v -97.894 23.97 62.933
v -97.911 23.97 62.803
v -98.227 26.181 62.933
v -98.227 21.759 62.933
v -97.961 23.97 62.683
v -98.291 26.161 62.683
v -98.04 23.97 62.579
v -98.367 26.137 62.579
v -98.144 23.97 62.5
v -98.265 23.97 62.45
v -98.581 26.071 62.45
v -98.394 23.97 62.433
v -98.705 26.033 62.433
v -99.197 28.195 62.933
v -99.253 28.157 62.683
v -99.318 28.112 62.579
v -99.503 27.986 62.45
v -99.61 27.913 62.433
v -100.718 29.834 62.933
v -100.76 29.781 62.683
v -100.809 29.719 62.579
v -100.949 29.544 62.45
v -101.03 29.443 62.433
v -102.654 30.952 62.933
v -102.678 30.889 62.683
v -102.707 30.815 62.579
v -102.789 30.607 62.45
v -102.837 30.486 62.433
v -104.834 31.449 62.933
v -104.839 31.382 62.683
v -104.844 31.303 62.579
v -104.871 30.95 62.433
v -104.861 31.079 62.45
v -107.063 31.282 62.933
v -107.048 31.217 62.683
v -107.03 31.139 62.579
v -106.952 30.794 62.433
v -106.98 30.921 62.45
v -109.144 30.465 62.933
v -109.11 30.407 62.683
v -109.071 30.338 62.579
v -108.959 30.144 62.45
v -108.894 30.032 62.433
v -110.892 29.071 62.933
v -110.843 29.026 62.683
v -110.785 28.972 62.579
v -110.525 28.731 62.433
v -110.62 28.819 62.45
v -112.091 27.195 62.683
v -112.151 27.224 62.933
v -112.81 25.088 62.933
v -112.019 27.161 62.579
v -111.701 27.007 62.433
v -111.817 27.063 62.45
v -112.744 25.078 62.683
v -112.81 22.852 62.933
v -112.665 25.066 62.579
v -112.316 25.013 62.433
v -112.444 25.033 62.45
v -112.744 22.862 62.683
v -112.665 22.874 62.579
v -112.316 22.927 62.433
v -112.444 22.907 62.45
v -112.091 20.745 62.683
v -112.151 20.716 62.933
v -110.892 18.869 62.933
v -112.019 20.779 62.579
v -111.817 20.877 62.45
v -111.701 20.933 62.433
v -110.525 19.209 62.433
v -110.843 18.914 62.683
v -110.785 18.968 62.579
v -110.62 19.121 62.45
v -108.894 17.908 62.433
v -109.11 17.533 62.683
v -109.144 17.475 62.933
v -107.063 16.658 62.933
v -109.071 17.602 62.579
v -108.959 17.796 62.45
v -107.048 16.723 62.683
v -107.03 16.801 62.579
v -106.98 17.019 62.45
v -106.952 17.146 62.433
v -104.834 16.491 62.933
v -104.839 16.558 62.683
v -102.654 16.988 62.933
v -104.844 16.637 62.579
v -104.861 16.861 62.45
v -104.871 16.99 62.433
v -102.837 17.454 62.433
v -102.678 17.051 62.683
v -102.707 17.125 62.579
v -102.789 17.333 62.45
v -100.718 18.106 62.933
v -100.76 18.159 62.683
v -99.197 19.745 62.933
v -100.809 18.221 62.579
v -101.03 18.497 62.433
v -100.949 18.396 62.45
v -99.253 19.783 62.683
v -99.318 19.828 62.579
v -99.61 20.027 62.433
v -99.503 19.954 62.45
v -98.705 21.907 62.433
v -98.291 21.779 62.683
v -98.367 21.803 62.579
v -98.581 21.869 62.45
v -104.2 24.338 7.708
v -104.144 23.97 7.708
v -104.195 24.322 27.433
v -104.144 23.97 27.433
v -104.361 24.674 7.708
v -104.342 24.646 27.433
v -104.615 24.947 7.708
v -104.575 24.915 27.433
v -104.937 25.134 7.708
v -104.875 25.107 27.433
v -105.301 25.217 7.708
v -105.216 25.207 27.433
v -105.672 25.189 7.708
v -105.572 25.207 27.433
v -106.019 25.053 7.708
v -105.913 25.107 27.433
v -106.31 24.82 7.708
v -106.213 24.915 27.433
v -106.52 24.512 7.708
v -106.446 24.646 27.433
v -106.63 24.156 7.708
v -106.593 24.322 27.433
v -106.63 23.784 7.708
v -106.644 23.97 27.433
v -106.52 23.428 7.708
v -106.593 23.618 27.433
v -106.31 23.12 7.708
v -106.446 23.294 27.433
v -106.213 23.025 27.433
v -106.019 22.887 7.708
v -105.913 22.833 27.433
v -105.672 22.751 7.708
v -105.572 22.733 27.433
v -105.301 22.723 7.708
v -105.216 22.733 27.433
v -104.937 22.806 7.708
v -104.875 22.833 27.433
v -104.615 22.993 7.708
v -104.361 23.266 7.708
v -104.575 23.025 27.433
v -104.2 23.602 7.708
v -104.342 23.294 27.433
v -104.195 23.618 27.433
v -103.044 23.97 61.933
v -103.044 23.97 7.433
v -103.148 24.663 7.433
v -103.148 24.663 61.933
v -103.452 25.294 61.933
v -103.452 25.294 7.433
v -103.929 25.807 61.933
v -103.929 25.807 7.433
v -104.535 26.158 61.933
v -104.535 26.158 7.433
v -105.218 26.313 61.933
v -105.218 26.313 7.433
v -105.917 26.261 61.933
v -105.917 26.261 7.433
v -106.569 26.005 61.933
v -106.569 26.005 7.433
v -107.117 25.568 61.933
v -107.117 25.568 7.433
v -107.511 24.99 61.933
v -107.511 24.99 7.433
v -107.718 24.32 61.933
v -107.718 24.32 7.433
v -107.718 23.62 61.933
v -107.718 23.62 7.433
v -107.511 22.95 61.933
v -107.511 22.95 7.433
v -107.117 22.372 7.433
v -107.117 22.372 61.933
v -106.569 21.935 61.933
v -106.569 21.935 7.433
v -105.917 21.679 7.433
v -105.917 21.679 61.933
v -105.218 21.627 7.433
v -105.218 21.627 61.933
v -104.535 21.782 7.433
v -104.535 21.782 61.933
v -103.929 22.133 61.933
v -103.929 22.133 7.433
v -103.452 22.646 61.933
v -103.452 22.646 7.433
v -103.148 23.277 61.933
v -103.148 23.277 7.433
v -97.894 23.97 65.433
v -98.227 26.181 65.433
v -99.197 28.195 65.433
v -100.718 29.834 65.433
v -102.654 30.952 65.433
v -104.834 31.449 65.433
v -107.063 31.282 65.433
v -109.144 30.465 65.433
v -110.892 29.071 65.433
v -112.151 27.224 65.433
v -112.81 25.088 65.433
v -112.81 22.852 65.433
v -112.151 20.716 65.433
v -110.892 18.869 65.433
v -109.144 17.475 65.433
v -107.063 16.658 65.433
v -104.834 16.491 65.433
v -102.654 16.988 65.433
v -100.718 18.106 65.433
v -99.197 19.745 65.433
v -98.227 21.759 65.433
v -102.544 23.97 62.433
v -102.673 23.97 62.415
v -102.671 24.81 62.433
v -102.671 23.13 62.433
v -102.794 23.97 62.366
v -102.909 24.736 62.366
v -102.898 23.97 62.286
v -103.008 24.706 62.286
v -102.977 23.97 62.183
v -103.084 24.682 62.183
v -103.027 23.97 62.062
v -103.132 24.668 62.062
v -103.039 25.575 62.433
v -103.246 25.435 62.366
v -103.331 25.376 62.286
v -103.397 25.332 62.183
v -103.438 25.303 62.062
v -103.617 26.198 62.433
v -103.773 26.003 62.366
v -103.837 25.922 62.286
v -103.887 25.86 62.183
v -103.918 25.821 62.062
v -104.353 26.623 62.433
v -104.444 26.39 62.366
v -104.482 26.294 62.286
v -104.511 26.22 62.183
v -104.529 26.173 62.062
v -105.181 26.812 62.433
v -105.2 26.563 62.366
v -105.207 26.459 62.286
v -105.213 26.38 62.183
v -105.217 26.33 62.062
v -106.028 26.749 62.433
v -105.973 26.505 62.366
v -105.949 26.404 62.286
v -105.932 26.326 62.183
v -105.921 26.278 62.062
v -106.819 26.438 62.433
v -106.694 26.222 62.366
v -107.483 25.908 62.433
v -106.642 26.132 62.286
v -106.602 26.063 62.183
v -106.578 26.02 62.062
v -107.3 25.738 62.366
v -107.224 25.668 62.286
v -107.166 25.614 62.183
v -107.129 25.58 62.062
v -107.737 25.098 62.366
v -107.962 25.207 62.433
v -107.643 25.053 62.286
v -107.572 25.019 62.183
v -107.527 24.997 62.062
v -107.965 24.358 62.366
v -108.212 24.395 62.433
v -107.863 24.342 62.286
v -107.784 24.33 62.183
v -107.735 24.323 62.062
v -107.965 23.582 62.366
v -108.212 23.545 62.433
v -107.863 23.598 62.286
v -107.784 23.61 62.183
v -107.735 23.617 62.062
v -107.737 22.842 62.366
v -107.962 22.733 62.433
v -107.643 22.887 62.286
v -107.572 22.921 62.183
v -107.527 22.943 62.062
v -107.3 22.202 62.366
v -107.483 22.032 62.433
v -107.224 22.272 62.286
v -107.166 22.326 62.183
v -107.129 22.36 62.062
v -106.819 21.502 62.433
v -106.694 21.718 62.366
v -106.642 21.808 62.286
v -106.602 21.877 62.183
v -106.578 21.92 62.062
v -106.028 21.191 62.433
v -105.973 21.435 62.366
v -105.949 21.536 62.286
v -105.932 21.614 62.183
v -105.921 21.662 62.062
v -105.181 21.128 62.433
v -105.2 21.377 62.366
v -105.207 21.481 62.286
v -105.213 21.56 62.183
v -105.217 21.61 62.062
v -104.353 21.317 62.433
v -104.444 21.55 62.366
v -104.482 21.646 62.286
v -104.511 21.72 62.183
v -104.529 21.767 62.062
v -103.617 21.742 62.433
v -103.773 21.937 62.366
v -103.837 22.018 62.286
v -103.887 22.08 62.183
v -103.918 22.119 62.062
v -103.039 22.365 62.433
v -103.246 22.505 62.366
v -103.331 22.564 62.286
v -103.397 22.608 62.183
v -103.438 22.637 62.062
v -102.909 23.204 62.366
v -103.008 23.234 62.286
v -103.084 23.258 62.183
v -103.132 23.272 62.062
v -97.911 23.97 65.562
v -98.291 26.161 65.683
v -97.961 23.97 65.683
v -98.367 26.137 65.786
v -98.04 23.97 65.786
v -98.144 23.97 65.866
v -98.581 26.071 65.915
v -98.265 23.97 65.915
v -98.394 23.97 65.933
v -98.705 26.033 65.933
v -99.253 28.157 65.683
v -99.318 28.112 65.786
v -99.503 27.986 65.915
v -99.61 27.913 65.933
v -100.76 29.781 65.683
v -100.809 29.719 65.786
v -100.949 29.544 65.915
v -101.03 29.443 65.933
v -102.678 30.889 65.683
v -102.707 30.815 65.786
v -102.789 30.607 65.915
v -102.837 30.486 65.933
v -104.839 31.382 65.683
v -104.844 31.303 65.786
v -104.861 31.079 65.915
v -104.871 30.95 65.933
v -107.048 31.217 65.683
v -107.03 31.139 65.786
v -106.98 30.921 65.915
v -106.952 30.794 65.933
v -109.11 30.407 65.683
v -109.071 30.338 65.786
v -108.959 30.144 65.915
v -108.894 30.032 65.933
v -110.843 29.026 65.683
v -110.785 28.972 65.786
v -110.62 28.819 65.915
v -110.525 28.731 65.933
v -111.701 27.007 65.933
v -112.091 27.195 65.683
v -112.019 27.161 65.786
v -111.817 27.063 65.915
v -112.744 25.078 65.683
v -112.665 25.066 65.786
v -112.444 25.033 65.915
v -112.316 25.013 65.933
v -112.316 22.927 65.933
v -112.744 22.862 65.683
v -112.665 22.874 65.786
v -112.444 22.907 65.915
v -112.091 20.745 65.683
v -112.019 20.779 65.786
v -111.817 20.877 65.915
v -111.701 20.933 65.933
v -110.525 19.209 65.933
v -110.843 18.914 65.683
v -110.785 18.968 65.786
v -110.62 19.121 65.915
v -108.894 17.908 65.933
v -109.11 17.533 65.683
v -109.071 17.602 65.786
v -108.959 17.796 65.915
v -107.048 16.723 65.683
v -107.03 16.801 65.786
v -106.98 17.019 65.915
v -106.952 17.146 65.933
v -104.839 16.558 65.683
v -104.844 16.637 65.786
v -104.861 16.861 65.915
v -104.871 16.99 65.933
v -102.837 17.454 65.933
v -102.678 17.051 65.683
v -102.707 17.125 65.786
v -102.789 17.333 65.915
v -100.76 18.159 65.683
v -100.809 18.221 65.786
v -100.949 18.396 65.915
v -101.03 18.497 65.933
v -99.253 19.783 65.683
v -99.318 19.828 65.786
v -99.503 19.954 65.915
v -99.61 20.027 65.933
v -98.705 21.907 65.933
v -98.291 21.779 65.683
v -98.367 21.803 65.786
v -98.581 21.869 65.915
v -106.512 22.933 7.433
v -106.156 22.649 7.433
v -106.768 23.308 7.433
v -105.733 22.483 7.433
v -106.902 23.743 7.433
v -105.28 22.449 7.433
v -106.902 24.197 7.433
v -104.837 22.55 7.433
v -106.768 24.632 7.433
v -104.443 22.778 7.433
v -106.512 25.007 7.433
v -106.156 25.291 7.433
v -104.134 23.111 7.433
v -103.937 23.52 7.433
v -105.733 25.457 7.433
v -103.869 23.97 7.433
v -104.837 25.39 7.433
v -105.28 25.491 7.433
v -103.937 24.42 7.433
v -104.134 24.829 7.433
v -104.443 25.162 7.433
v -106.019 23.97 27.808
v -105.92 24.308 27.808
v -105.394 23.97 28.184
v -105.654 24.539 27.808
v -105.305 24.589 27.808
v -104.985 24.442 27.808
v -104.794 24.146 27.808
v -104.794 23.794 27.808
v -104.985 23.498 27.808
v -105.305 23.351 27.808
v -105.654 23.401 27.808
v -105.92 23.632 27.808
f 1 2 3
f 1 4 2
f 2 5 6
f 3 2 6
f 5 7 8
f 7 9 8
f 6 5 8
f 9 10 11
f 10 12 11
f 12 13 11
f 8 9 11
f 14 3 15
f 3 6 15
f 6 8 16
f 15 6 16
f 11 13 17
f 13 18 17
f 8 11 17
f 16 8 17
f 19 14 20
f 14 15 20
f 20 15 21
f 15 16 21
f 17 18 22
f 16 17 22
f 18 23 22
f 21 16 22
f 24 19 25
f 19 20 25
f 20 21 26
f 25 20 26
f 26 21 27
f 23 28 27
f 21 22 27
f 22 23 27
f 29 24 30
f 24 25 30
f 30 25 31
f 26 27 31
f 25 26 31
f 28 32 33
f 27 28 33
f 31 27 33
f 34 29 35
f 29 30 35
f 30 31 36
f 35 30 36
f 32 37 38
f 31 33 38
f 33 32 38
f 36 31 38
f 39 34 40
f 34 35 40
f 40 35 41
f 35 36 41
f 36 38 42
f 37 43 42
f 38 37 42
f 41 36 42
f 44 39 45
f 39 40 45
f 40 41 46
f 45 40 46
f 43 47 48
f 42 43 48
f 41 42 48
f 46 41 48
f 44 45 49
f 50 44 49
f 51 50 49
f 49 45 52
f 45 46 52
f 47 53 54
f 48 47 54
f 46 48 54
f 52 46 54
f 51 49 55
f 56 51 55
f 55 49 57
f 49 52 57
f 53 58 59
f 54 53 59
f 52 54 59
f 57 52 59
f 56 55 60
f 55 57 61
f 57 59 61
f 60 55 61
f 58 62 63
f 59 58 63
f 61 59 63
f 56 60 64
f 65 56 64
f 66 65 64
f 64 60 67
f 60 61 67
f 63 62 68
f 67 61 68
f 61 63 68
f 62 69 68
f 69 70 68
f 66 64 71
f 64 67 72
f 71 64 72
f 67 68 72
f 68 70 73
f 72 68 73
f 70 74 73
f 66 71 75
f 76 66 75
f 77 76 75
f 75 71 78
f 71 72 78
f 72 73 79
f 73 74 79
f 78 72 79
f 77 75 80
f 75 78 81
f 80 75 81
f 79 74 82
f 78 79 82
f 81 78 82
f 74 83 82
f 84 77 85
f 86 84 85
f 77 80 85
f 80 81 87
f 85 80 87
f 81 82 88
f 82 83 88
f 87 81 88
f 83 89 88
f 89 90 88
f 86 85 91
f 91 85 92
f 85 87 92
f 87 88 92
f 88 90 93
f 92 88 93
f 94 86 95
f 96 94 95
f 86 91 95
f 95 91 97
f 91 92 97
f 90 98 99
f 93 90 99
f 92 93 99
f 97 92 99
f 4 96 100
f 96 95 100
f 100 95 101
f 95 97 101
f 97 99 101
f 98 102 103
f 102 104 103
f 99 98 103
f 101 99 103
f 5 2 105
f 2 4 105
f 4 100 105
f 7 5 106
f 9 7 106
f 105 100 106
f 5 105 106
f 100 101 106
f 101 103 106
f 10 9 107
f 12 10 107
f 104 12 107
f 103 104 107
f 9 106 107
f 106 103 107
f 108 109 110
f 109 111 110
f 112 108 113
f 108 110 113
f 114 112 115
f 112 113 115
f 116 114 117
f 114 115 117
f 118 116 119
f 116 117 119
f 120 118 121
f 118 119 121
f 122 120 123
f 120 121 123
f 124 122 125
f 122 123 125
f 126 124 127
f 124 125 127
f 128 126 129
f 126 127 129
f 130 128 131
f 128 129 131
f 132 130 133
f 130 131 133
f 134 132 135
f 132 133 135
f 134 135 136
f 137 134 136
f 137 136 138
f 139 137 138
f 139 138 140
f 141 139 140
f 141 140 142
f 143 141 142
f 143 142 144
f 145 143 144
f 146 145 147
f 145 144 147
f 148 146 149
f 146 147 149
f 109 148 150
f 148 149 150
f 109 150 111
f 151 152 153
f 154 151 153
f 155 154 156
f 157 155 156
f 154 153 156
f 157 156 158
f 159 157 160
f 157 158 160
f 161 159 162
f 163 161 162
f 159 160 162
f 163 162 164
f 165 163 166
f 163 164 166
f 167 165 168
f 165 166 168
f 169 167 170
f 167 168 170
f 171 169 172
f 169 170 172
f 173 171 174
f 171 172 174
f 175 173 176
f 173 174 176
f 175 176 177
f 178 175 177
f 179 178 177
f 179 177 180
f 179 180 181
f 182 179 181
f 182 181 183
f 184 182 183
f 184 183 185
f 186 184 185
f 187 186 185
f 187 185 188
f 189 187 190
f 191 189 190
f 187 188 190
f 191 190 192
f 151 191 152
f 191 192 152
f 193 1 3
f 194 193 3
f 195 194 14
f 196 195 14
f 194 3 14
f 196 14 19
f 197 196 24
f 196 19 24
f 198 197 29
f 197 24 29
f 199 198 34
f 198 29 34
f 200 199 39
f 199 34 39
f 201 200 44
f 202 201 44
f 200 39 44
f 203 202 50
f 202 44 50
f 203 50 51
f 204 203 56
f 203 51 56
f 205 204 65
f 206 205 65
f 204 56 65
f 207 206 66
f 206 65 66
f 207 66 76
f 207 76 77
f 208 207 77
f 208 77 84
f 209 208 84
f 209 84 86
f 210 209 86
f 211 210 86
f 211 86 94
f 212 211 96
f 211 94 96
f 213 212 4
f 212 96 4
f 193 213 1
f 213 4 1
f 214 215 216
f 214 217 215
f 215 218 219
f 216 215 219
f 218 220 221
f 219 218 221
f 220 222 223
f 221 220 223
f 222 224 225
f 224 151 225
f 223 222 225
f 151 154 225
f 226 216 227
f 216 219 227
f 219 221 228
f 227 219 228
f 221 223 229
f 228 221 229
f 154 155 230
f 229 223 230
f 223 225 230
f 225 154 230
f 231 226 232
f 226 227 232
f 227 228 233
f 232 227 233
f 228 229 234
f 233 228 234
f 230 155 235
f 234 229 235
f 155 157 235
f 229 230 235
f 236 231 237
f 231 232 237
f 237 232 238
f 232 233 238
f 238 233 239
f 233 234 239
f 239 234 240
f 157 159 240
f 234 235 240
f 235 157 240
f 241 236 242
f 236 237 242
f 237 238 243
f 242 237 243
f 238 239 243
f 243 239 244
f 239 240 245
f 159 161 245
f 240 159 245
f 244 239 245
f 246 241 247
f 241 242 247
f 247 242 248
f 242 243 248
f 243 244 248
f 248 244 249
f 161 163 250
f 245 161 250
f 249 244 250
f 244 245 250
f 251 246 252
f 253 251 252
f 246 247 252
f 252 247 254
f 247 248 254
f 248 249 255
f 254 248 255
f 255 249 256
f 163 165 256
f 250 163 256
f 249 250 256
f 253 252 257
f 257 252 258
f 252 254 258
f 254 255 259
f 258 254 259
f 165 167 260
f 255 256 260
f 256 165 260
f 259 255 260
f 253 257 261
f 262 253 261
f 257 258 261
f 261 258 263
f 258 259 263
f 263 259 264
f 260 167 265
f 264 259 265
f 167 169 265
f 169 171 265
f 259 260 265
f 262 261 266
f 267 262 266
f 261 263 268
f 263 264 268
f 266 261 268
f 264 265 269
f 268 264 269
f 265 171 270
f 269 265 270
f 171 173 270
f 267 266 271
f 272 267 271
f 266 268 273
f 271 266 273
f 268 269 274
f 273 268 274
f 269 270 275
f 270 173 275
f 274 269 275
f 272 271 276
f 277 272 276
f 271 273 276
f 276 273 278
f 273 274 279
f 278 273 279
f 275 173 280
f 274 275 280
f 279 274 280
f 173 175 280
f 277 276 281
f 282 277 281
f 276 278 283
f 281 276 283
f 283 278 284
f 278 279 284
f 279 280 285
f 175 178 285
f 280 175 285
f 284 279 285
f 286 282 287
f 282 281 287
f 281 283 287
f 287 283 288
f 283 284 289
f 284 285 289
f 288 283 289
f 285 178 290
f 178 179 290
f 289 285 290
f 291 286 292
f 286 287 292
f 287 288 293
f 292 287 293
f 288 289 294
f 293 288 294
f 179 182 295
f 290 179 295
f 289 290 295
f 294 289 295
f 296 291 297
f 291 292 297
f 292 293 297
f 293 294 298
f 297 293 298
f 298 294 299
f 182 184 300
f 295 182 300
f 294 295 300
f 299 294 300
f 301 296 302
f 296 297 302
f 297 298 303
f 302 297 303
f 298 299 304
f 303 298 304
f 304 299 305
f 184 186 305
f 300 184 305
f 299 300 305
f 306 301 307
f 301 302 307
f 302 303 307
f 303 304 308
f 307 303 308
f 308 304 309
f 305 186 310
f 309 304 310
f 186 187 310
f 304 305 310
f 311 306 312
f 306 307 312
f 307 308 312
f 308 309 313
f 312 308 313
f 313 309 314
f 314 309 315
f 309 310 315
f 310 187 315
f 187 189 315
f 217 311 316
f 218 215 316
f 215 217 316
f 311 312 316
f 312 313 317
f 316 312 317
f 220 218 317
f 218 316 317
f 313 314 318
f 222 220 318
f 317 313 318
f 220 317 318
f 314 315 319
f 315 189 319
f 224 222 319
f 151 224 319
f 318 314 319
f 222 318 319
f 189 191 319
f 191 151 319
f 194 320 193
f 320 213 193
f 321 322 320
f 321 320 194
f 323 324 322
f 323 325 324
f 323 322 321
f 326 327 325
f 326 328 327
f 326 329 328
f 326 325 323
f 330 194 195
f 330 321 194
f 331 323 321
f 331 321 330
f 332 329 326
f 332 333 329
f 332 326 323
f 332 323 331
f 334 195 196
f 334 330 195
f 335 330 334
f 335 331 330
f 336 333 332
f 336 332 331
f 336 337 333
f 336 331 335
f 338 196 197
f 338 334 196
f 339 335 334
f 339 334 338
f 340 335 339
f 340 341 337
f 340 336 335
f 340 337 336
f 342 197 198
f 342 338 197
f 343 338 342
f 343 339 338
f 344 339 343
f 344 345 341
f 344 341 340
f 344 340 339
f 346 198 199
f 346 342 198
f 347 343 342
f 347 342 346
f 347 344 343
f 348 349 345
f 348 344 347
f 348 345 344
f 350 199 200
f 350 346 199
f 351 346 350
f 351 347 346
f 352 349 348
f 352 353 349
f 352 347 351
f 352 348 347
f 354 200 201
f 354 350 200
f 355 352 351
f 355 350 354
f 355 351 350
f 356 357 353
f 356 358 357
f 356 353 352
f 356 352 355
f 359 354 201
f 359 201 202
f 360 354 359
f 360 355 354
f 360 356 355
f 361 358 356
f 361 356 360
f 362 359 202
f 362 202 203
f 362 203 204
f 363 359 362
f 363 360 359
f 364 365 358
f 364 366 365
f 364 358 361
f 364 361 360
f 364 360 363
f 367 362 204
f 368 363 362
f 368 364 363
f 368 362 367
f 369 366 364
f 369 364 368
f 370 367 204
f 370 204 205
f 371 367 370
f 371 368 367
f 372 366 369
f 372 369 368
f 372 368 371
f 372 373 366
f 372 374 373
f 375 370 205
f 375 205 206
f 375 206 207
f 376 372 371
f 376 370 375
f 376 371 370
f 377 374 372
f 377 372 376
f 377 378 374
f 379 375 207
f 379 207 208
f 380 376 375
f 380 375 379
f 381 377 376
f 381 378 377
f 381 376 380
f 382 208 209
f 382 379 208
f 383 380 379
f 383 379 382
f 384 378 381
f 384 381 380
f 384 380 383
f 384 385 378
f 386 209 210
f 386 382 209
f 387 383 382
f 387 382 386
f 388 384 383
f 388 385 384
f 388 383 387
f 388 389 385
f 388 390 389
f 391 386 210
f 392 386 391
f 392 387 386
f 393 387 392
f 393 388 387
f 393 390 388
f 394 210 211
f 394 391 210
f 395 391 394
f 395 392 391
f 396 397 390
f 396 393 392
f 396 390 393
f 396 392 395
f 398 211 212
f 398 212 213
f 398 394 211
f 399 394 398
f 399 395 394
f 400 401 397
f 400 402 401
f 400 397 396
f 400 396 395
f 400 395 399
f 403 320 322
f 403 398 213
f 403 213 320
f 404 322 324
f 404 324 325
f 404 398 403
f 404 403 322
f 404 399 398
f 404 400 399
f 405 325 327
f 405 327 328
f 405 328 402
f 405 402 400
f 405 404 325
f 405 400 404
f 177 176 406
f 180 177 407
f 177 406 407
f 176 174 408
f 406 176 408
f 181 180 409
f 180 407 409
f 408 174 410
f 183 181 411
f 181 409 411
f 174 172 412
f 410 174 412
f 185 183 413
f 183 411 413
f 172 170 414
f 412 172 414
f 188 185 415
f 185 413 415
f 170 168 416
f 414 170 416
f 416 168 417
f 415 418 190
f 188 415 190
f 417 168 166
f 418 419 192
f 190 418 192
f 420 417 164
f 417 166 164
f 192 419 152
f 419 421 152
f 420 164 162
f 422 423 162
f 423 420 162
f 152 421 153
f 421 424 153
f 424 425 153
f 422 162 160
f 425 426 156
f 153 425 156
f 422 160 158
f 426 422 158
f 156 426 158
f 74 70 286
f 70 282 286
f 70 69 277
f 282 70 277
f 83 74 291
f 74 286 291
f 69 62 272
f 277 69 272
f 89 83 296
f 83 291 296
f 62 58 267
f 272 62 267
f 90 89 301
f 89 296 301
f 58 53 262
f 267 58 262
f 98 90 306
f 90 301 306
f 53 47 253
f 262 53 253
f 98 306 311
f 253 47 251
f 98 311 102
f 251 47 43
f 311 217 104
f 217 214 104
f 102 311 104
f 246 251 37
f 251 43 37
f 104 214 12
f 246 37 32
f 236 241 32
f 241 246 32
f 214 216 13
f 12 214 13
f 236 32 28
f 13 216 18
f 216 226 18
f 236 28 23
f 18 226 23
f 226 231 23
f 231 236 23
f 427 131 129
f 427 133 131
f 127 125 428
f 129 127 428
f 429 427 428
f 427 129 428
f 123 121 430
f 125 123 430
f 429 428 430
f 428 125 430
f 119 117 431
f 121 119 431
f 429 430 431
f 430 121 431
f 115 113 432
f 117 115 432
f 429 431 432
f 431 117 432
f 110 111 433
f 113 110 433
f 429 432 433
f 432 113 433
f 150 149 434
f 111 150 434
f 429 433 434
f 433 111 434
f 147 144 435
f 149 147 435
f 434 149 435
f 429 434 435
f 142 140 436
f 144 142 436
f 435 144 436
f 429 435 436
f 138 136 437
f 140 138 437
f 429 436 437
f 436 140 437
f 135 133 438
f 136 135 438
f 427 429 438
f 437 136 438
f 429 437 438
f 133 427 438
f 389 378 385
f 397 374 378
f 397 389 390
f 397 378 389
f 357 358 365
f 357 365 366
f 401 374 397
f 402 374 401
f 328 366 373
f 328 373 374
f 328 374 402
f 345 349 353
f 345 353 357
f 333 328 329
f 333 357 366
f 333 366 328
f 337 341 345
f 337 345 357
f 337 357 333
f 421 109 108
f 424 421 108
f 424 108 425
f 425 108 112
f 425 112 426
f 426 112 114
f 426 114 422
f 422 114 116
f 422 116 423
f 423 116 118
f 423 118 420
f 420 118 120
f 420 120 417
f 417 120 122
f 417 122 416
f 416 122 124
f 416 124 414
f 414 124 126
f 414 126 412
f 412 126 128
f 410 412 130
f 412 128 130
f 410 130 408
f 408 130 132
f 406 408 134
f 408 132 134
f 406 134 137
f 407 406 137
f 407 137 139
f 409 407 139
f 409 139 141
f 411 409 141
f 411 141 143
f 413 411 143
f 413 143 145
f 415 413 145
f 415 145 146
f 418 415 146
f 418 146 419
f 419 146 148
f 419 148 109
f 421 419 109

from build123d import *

# Parameters (mm, degrees)
SKETCH2_R                       = 2.35
BOSS_EXTRUDE1_DEPTH             = 55
SKETCH3_R                       = 7.5
BOSS_EXTRUDE2_DEPTH             = 3.5
FILLET1_R                       = 0.5
M3X0_5_TAPPED_HOLE1_D           = 2.5
M3X0_5_TAPPED_HOLE1_DEPTH       = 20
M3X0_5_TAPPED_HOLE1_CSINK_D     = 3.05
M3X0_5_TAPPED_HOLE1_CSINK_ANGLE = 90
M3X0_5_TAPPED_HOLE1_TIP         = 0.751075774


with BuildPart() as part:
    # Sketch2 → Boss-Extrude1 (new body)
    with BuildSketch(Plane.XY.offset(7.432534475)):
        with Locations((-105.393983784, 23.97)):
            Circle(SKETCH2_R)
    extrude(amount=BOSS_EXTRUDE1_DEPTH)

    # Sketch3 → Boss-Extrude2 (add)
    with BuildSketch(Plane.XY.offset(62.432534475)):
        with Locations((-105.393983784, 23.97)):
            Circle(SKETCH3_R)
    extrude(amount=BOSS_EXTRUDE2_DEPTH)

    # Fillet1
    fillet1_edges = [part.edges().sort_by_distance(p)[0] for p in [
        (-107.743983784, 23.97, 62.432534475),
        (-112.893983784, 23.97, 62.432534475),
        (-112.893983784, 23.97, 65.932534475),
    ]]
    fillet(fillet1_edges, radius=FILLET1_R)

    # M3x0.5 Tapped Hole1
    with Locations(Plane(origin=(-105.393983784, 23.97, 7.432534475), x_dir=(-1, 0, 0), z_dir=(0, 0, -1))):
        with Locations((0, 0)):
            CounterSinkHole(M3X0_5_TAPPED_HOLE1_D / 2, M3X0_5_TAPPED_HOLE1_CSINK_D / 2, depth=M3X0_5_TAPPED_HOLE1_DEPTH, counter_sink_angle=M3X0_5_TAPPED_HOLE1_CSINK_ANGLE)
            with Locations((0, 0, -(M3X0_5_TAPPED_HOLE1_DEPTH + M3X0_5_TAPPED_HOLE1_TIP / 2))):  # 118° drill point
                Cone(0, M3X0_5_TAPPED_HOLE1_D / 2, M3X0_5_TAPPED_HOLE1_TIP, mode=Mode.SUBTRACT)


solid = part.part
